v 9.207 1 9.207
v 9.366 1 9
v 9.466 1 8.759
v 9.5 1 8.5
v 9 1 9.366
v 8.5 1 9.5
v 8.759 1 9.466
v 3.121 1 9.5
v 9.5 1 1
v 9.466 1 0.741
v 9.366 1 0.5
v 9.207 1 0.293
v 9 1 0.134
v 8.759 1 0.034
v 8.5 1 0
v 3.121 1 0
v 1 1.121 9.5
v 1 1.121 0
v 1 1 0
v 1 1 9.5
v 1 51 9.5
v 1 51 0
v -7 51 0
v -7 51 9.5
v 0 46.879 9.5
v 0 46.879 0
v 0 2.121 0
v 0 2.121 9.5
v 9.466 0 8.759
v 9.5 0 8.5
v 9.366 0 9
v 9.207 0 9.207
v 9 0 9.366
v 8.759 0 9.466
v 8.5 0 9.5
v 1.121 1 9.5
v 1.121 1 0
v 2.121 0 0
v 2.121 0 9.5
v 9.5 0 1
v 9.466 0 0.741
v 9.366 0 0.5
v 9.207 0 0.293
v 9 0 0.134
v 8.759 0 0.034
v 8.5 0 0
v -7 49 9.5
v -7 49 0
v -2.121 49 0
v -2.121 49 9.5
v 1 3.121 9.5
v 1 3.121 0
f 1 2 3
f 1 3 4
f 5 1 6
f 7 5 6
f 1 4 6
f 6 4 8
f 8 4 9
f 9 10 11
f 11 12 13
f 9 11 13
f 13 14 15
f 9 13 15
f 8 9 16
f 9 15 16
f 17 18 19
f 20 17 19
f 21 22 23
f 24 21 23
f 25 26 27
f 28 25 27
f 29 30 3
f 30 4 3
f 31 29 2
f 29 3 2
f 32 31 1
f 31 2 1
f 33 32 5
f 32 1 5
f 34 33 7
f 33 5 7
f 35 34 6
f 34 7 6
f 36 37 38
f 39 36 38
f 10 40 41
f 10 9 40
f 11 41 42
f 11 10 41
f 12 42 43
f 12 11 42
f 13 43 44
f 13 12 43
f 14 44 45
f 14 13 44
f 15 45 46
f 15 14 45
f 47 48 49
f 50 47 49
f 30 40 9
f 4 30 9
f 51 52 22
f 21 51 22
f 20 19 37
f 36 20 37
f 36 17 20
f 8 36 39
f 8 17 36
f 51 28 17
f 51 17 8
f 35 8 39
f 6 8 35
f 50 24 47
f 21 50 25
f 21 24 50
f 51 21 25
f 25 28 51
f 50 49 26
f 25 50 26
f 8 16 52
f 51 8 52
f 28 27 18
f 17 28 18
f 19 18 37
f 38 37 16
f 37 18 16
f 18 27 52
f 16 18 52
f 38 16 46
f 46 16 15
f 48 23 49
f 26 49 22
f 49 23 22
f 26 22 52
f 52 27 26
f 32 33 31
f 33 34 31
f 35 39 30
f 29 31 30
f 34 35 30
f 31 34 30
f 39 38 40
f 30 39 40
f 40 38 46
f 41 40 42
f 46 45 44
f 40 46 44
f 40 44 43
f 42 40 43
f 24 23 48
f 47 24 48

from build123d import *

# Parameters (mm, degrees)
F1_DEPTH = 9.5
F2_R     = 1


with BuildPart() as f1:
    # F0 (on Top) → F1 (new body)
    with BuildSketch(Plane.XY):
        Polygon((-2.12132, 49), (0, 49), (0, 46.87868), (0, 2.12132), (1, 1.12132), (1, 3.12132), (1, 51), (-7, 51), (-7, 49), align=None)
        Polygon((0, 46.87868), (0, 49), (-2.12132, 49), align=None)
        Polygon((1.12132, 1), (1, 1.12132), (1, 1), align=None)
        Polygon((1, 3.12132), (1, 1.12132), (1.12132, 1), (3.12132, 1), align=None)
        Polygon((3.12132, 1), (1.12132, 1), (2.12132, 0), (9.5, 0), (9.5, 1), align=None)
    extrude(amount=F1_DEPTH)

    # F2
    f2_edges = [f1.edges().sort_by_distance(p)[0] for p in [
        (9.5, 0.5, 9.5),
        (9.5, 0.5, 0),
    ]]
    fillet(f2_edges, radius=F2_R)


solid = f1.part
